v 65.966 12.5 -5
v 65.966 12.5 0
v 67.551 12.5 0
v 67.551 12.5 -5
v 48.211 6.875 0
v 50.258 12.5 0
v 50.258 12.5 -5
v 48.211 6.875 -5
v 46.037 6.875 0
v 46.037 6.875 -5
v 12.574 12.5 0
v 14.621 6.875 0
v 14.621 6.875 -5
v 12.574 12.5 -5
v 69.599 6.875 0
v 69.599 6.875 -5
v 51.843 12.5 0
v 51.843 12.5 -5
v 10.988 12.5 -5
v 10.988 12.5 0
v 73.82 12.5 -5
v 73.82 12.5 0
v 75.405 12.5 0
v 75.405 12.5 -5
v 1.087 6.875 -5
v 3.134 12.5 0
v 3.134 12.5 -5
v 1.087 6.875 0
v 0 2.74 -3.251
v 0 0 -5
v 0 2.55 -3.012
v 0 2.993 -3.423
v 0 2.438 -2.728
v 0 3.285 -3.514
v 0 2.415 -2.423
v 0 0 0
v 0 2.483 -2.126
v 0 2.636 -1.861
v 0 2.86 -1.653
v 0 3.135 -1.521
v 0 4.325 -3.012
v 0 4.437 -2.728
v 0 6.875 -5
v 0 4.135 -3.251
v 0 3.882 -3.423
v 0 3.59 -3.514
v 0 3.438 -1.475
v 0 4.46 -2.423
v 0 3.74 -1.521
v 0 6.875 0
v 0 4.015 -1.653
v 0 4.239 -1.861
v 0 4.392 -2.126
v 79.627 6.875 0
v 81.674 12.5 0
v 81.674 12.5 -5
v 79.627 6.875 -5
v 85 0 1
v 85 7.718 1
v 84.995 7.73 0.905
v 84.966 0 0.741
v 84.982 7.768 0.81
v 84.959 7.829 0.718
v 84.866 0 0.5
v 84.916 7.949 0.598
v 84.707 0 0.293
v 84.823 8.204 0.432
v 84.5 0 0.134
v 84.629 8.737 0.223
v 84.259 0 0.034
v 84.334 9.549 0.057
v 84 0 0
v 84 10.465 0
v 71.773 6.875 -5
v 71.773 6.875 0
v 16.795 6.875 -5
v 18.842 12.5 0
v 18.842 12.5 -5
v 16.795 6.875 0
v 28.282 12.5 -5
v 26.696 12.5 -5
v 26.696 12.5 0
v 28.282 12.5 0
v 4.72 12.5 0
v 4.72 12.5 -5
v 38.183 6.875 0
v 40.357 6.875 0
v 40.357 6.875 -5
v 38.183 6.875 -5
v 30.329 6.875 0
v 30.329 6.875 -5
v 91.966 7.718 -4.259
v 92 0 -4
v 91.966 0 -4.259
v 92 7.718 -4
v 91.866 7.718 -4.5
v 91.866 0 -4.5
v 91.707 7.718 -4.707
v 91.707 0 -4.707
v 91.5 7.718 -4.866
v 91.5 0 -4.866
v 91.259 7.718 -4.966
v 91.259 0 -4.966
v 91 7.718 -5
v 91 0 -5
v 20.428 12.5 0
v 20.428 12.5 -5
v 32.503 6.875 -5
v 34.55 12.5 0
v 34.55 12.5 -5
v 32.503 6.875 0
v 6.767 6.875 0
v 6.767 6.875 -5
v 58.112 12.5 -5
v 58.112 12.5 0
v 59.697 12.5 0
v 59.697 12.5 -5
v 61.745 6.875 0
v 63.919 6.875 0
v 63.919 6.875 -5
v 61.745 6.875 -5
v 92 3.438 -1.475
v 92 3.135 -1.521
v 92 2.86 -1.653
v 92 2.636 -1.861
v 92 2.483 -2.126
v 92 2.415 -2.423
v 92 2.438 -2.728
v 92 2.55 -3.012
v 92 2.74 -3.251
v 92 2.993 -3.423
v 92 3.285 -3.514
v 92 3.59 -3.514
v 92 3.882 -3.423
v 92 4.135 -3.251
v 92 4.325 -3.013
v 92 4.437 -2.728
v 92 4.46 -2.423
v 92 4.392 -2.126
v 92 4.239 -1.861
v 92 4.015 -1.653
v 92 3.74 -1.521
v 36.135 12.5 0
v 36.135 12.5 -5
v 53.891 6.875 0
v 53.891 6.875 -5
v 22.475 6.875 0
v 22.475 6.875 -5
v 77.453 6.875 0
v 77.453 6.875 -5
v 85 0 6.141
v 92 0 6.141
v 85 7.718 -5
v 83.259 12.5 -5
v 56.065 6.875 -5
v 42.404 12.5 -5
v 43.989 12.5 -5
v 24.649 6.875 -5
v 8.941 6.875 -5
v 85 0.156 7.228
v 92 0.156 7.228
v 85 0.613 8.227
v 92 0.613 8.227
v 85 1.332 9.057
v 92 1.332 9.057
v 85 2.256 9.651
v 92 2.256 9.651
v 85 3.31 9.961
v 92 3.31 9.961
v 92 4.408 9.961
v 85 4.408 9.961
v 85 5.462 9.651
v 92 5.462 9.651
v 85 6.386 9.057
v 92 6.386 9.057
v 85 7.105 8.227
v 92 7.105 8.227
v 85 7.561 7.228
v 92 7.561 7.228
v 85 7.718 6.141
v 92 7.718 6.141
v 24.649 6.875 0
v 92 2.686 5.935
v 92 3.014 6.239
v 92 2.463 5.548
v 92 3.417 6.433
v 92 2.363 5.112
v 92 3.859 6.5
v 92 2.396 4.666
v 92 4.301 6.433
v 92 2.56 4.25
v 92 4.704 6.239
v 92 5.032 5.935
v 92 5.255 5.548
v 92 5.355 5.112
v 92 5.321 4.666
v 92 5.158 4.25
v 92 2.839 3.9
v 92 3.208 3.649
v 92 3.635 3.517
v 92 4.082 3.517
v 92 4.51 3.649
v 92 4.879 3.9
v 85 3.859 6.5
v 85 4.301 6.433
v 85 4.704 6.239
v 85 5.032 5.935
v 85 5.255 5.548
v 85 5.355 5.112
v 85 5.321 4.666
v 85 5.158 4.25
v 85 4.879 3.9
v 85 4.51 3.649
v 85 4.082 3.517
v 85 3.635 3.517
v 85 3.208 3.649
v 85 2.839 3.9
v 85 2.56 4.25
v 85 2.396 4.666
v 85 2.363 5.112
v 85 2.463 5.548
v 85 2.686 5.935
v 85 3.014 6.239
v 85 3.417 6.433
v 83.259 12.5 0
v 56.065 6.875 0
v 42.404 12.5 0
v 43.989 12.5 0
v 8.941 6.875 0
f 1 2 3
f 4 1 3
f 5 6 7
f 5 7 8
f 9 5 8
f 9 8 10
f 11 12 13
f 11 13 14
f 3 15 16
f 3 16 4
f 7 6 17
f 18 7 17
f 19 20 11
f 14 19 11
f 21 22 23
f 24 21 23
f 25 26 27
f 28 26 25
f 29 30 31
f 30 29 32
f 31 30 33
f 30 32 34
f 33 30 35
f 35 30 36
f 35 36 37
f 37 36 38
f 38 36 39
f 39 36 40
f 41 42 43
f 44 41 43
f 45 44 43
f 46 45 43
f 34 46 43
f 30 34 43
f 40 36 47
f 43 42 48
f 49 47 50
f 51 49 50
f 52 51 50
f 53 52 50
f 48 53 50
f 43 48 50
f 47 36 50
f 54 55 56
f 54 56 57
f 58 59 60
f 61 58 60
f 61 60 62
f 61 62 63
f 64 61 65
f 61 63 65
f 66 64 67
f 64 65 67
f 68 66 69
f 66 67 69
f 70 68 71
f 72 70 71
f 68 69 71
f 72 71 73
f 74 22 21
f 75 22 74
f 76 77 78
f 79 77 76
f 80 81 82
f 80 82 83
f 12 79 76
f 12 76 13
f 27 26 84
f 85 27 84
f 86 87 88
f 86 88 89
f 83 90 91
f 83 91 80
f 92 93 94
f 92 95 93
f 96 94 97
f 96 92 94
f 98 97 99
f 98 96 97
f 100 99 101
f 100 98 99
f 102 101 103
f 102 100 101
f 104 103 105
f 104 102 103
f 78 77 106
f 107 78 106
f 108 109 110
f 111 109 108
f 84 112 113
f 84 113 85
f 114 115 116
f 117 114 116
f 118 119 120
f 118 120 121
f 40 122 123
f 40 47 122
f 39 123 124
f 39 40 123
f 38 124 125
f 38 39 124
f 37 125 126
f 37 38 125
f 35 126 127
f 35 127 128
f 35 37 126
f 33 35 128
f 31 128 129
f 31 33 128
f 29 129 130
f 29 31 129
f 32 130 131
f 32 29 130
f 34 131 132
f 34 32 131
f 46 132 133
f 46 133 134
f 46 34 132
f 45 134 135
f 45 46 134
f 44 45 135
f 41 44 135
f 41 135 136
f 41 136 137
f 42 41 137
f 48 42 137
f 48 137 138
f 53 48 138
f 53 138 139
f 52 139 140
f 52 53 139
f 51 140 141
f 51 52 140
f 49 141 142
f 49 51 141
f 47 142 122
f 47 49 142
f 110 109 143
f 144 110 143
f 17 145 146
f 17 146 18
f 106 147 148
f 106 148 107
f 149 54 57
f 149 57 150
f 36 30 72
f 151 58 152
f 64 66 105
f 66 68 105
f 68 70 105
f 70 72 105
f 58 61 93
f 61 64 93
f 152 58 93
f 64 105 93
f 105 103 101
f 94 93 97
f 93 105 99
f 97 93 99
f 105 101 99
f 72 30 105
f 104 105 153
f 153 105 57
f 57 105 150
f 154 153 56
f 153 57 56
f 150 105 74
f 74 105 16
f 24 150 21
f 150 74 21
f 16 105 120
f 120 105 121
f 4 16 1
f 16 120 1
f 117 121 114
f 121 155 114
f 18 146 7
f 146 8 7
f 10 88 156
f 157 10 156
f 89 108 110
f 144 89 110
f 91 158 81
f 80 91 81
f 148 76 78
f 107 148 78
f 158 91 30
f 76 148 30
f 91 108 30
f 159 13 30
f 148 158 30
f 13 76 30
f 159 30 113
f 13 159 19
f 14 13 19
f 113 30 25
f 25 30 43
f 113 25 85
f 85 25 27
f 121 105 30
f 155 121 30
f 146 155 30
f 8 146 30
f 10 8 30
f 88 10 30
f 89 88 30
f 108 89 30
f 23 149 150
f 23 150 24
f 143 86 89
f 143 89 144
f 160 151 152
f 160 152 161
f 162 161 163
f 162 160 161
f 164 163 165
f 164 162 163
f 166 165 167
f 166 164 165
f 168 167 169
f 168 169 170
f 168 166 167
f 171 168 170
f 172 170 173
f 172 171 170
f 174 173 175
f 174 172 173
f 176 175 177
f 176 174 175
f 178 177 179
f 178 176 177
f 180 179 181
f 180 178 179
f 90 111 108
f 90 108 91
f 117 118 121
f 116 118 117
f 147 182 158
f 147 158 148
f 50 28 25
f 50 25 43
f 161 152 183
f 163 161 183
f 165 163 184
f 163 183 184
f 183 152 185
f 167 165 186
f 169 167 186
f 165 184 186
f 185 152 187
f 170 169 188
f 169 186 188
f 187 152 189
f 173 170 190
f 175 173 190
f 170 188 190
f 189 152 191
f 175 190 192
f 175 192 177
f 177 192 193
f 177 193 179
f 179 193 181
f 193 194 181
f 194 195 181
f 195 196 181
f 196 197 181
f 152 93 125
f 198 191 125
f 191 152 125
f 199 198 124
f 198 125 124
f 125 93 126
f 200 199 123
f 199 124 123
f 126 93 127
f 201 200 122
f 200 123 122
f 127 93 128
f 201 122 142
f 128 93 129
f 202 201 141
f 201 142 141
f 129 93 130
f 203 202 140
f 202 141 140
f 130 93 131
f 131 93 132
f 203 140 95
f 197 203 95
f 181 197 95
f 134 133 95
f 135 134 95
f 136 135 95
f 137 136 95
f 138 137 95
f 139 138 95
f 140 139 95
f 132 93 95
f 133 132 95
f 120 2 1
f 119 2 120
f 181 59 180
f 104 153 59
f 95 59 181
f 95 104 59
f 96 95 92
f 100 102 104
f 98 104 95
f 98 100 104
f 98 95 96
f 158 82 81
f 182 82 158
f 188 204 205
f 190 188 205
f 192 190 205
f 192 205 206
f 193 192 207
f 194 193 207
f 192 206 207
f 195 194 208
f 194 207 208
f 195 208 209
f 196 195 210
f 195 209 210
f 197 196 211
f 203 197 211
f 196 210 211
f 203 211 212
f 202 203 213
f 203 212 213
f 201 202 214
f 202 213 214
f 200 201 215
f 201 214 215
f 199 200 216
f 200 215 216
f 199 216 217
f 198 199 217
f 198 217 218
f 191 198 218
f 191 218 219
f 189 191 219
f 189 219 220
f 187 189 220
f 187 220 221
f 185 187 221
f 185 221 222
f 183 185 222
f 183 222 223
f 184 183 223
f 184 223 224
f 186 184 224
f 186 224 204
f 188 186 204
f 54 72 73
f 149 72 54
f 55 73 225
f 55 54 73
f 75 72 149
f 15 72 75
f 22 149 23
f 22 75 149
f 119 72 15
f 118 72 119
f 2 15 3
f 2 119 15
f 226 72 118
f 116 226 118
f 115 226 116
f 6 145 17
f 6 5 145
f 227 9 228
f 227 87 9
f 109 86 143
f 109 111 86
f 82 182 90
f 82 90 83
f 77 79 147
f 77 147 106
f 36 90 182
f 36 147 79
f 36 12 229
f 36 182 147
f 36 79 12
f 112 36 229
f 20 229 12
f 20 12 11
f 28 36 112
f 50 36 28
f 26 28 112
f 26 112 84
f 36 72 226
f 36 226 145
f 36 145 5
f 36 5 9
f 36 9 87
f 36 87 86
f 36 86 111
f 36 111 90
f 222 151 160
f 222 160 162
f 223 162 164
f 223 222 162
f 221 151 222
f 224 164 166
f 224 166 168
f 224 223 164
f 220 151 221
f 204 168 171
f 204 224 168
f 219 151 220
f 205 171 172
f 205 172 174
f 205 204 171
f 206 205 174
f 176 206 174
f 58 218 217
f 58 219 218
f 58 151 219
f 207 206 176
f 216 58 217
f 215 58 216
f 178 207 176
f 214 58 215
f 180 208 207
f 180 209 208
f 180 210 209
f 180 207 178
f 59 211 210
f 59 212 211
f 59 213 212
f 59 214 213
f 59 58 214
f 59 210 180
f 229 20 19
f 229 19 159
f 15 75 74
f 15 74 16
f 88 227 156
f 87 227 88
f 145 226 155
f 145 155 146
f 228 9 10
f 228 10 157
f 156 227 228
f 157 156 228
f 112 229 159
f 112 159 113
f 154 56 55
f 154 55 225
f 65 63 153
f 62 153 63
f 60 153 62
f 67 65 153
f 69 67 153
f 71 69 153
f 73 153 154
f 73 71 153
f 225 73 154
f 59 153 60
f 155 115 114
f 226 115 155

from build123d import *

# Parameters (mm, degrees)
BLANKSKE_W              = 85
BLANKSKE_H              = 12.5
BLANK_DEPTH             = 5
TOOTHCUTSIM_DEPTH       = 87.05957239
TEETHCUTS_COUNT         = 12
TEETHCUTS_PITCH         = 7.853981625
ESQUISSE1_R             = 1.025
ENL_V_MAT_EXTRU_1_DEPTH = 87.05957239
ESQUISSE3_W             = 5
ESQUISSE3_H             = 7.71767729
ESQUISSE3_R             = 1.025
BOSS_EXTRU_1_DEPTH      = 7
ESQUISSE4_W             = 7
ESQUISSE4_H             = 7.71767729
BOSS_EXTRU_2_DEPTH      = 10
ESQUISSE5_R             = 1.5
ENL_V_MAT_EXTRU_2_DEPTH = 87.49421946
CONG_1_RADIUS           = 3.858838645
CONG_1_LENGTH           = 7
CONG_2_R                = 1
CONG_3_R                = 1


with BuildPart() as part:
    # BlankSke → Blank (new body)
    with BuildSketch(Plane.XY):
        with Locations((42.5, 6.25)):
            Rectangle(BLANKSKE_W, BLANKSKE_H)
    extrude(amount=-BLANK_DEPTH)

    # TooCutSkeSim → ToothCutSim (cut, through all)
    with BuildSketch(Plane.XY):
        Polygon((1.087088424, 6.875), (-1.087088424, 6.875), (-3.143665836, 12.5254), (3.143665836, 12.5254), align=None)
    toothcutsim = extrude(amount=-TOOTHCUTSIM_DEPTH, mode=Mode.SUBTRACT)

    # TeethCuts: ToothCutSim ×12
    with Locations(*[(i * TEETHCUTS_PITCH, 0, 0) for i in range(1, TEETHCUTS_COUNT)]):
        add(toothcutsim, mode=Mode.SUBTRACT)

    # Esquisse1 → Enlèv. mat.-Extru.1 (cut, through all)
    with BuildSketch(Plane.ZY):
        with Locations((-2.5, 3.4375)):
            Circle(ESQUISSE1_R)
    extrude(amount=-ENL_V_MAT_EXTRU_1_DEPTH, mode=Mode.SUBTRACT)

    # Esquisse3 → Boss.-Extru.1 (add)
    with BuildSketch(Plane(origin=(85, 0, 0), x_dir=(0, 0, -1), z_dir=(1, 0, 0))):
        with Locations((2.5, 3.858838645)):
            Rectangle(ESQUISSE3_W, ESQUISSE3_H)
        with Locations(Location((2.5, 3.4375, 0), (0, 0, 180))):
            Circle(ESQUISSE3_R, mode=Mode.SUBTRACT)
    extrude(amount=BOSS_EXTRU_1_DEPTH)

    # Esquisse4 → Boss.-Extru.2 (add)
    with BuildSketch(Plane.XY):
        with Locations((88.5, 3.858838645)):
            Rectangle(ESQUISSE4_W, ESQUISSE4_H)
    extrude(amount=BOSS_EXTRU_2_DEPTH)

    # Esquisse5 → Enlèv. mat.-Extru.2 (cut, through all)
    with BuildSketch(Plane.ZY.offset(-85)):
        with Locations((5, 3.858838645)):
            Circle(ESQUISSE5_R)
    extrude(amount=-ENL_V_MAT_EXTRU_2_DEPTH, mode=Mode.SUBTRACT)

    # Congé1: full round fillet: the end face becomes a half cylinder, R = half its width
    cong_1_face = Plane((88.5, 3.858838645, 10), x_dir=(-1, 0, 0), z_dir=(0, 0, 1))  # on the end face: x along it, z out of the body
    cong_1_slab = cong_1_face.offset(-CONG_1_RADIUS / 2) * Box(CONG_1_LENGTH, 2 * CONG_1_RADIUS, CONG_1_RADIUS, mode=Mode.PRIVATE)  # the body's end, R deep
    cong_1_round = Plane((88.5, 3.858838645, 6.141161355), x_dir=(0, 0, 1), z_dir=(-1, 0, 0)) * Cylinder(CONG_1_RADIUS, CONG_1_LENGTH, mode=Mode.PRIVATE)  # its axis R under the face
    add(cong_1_slab - cong_1_round, mode=Mode.SUBTRACT)

    # Congé2
    cong_2_edges = [part.edges().sort_by_distance(p)[0] for p in [
        (85, 3.858838645, 0),
    ]]
    fillet(cong_2_edges, radius=CONG_2_R)

    # Congé3
    cong_3_edges = [part.edges().sort_by_distance(p)[0] for p in [
        (92, 3.858838645, -5),
    ]]
    fillet(cong_3_edges, radius=CONG_3_R)


solid = part.part
